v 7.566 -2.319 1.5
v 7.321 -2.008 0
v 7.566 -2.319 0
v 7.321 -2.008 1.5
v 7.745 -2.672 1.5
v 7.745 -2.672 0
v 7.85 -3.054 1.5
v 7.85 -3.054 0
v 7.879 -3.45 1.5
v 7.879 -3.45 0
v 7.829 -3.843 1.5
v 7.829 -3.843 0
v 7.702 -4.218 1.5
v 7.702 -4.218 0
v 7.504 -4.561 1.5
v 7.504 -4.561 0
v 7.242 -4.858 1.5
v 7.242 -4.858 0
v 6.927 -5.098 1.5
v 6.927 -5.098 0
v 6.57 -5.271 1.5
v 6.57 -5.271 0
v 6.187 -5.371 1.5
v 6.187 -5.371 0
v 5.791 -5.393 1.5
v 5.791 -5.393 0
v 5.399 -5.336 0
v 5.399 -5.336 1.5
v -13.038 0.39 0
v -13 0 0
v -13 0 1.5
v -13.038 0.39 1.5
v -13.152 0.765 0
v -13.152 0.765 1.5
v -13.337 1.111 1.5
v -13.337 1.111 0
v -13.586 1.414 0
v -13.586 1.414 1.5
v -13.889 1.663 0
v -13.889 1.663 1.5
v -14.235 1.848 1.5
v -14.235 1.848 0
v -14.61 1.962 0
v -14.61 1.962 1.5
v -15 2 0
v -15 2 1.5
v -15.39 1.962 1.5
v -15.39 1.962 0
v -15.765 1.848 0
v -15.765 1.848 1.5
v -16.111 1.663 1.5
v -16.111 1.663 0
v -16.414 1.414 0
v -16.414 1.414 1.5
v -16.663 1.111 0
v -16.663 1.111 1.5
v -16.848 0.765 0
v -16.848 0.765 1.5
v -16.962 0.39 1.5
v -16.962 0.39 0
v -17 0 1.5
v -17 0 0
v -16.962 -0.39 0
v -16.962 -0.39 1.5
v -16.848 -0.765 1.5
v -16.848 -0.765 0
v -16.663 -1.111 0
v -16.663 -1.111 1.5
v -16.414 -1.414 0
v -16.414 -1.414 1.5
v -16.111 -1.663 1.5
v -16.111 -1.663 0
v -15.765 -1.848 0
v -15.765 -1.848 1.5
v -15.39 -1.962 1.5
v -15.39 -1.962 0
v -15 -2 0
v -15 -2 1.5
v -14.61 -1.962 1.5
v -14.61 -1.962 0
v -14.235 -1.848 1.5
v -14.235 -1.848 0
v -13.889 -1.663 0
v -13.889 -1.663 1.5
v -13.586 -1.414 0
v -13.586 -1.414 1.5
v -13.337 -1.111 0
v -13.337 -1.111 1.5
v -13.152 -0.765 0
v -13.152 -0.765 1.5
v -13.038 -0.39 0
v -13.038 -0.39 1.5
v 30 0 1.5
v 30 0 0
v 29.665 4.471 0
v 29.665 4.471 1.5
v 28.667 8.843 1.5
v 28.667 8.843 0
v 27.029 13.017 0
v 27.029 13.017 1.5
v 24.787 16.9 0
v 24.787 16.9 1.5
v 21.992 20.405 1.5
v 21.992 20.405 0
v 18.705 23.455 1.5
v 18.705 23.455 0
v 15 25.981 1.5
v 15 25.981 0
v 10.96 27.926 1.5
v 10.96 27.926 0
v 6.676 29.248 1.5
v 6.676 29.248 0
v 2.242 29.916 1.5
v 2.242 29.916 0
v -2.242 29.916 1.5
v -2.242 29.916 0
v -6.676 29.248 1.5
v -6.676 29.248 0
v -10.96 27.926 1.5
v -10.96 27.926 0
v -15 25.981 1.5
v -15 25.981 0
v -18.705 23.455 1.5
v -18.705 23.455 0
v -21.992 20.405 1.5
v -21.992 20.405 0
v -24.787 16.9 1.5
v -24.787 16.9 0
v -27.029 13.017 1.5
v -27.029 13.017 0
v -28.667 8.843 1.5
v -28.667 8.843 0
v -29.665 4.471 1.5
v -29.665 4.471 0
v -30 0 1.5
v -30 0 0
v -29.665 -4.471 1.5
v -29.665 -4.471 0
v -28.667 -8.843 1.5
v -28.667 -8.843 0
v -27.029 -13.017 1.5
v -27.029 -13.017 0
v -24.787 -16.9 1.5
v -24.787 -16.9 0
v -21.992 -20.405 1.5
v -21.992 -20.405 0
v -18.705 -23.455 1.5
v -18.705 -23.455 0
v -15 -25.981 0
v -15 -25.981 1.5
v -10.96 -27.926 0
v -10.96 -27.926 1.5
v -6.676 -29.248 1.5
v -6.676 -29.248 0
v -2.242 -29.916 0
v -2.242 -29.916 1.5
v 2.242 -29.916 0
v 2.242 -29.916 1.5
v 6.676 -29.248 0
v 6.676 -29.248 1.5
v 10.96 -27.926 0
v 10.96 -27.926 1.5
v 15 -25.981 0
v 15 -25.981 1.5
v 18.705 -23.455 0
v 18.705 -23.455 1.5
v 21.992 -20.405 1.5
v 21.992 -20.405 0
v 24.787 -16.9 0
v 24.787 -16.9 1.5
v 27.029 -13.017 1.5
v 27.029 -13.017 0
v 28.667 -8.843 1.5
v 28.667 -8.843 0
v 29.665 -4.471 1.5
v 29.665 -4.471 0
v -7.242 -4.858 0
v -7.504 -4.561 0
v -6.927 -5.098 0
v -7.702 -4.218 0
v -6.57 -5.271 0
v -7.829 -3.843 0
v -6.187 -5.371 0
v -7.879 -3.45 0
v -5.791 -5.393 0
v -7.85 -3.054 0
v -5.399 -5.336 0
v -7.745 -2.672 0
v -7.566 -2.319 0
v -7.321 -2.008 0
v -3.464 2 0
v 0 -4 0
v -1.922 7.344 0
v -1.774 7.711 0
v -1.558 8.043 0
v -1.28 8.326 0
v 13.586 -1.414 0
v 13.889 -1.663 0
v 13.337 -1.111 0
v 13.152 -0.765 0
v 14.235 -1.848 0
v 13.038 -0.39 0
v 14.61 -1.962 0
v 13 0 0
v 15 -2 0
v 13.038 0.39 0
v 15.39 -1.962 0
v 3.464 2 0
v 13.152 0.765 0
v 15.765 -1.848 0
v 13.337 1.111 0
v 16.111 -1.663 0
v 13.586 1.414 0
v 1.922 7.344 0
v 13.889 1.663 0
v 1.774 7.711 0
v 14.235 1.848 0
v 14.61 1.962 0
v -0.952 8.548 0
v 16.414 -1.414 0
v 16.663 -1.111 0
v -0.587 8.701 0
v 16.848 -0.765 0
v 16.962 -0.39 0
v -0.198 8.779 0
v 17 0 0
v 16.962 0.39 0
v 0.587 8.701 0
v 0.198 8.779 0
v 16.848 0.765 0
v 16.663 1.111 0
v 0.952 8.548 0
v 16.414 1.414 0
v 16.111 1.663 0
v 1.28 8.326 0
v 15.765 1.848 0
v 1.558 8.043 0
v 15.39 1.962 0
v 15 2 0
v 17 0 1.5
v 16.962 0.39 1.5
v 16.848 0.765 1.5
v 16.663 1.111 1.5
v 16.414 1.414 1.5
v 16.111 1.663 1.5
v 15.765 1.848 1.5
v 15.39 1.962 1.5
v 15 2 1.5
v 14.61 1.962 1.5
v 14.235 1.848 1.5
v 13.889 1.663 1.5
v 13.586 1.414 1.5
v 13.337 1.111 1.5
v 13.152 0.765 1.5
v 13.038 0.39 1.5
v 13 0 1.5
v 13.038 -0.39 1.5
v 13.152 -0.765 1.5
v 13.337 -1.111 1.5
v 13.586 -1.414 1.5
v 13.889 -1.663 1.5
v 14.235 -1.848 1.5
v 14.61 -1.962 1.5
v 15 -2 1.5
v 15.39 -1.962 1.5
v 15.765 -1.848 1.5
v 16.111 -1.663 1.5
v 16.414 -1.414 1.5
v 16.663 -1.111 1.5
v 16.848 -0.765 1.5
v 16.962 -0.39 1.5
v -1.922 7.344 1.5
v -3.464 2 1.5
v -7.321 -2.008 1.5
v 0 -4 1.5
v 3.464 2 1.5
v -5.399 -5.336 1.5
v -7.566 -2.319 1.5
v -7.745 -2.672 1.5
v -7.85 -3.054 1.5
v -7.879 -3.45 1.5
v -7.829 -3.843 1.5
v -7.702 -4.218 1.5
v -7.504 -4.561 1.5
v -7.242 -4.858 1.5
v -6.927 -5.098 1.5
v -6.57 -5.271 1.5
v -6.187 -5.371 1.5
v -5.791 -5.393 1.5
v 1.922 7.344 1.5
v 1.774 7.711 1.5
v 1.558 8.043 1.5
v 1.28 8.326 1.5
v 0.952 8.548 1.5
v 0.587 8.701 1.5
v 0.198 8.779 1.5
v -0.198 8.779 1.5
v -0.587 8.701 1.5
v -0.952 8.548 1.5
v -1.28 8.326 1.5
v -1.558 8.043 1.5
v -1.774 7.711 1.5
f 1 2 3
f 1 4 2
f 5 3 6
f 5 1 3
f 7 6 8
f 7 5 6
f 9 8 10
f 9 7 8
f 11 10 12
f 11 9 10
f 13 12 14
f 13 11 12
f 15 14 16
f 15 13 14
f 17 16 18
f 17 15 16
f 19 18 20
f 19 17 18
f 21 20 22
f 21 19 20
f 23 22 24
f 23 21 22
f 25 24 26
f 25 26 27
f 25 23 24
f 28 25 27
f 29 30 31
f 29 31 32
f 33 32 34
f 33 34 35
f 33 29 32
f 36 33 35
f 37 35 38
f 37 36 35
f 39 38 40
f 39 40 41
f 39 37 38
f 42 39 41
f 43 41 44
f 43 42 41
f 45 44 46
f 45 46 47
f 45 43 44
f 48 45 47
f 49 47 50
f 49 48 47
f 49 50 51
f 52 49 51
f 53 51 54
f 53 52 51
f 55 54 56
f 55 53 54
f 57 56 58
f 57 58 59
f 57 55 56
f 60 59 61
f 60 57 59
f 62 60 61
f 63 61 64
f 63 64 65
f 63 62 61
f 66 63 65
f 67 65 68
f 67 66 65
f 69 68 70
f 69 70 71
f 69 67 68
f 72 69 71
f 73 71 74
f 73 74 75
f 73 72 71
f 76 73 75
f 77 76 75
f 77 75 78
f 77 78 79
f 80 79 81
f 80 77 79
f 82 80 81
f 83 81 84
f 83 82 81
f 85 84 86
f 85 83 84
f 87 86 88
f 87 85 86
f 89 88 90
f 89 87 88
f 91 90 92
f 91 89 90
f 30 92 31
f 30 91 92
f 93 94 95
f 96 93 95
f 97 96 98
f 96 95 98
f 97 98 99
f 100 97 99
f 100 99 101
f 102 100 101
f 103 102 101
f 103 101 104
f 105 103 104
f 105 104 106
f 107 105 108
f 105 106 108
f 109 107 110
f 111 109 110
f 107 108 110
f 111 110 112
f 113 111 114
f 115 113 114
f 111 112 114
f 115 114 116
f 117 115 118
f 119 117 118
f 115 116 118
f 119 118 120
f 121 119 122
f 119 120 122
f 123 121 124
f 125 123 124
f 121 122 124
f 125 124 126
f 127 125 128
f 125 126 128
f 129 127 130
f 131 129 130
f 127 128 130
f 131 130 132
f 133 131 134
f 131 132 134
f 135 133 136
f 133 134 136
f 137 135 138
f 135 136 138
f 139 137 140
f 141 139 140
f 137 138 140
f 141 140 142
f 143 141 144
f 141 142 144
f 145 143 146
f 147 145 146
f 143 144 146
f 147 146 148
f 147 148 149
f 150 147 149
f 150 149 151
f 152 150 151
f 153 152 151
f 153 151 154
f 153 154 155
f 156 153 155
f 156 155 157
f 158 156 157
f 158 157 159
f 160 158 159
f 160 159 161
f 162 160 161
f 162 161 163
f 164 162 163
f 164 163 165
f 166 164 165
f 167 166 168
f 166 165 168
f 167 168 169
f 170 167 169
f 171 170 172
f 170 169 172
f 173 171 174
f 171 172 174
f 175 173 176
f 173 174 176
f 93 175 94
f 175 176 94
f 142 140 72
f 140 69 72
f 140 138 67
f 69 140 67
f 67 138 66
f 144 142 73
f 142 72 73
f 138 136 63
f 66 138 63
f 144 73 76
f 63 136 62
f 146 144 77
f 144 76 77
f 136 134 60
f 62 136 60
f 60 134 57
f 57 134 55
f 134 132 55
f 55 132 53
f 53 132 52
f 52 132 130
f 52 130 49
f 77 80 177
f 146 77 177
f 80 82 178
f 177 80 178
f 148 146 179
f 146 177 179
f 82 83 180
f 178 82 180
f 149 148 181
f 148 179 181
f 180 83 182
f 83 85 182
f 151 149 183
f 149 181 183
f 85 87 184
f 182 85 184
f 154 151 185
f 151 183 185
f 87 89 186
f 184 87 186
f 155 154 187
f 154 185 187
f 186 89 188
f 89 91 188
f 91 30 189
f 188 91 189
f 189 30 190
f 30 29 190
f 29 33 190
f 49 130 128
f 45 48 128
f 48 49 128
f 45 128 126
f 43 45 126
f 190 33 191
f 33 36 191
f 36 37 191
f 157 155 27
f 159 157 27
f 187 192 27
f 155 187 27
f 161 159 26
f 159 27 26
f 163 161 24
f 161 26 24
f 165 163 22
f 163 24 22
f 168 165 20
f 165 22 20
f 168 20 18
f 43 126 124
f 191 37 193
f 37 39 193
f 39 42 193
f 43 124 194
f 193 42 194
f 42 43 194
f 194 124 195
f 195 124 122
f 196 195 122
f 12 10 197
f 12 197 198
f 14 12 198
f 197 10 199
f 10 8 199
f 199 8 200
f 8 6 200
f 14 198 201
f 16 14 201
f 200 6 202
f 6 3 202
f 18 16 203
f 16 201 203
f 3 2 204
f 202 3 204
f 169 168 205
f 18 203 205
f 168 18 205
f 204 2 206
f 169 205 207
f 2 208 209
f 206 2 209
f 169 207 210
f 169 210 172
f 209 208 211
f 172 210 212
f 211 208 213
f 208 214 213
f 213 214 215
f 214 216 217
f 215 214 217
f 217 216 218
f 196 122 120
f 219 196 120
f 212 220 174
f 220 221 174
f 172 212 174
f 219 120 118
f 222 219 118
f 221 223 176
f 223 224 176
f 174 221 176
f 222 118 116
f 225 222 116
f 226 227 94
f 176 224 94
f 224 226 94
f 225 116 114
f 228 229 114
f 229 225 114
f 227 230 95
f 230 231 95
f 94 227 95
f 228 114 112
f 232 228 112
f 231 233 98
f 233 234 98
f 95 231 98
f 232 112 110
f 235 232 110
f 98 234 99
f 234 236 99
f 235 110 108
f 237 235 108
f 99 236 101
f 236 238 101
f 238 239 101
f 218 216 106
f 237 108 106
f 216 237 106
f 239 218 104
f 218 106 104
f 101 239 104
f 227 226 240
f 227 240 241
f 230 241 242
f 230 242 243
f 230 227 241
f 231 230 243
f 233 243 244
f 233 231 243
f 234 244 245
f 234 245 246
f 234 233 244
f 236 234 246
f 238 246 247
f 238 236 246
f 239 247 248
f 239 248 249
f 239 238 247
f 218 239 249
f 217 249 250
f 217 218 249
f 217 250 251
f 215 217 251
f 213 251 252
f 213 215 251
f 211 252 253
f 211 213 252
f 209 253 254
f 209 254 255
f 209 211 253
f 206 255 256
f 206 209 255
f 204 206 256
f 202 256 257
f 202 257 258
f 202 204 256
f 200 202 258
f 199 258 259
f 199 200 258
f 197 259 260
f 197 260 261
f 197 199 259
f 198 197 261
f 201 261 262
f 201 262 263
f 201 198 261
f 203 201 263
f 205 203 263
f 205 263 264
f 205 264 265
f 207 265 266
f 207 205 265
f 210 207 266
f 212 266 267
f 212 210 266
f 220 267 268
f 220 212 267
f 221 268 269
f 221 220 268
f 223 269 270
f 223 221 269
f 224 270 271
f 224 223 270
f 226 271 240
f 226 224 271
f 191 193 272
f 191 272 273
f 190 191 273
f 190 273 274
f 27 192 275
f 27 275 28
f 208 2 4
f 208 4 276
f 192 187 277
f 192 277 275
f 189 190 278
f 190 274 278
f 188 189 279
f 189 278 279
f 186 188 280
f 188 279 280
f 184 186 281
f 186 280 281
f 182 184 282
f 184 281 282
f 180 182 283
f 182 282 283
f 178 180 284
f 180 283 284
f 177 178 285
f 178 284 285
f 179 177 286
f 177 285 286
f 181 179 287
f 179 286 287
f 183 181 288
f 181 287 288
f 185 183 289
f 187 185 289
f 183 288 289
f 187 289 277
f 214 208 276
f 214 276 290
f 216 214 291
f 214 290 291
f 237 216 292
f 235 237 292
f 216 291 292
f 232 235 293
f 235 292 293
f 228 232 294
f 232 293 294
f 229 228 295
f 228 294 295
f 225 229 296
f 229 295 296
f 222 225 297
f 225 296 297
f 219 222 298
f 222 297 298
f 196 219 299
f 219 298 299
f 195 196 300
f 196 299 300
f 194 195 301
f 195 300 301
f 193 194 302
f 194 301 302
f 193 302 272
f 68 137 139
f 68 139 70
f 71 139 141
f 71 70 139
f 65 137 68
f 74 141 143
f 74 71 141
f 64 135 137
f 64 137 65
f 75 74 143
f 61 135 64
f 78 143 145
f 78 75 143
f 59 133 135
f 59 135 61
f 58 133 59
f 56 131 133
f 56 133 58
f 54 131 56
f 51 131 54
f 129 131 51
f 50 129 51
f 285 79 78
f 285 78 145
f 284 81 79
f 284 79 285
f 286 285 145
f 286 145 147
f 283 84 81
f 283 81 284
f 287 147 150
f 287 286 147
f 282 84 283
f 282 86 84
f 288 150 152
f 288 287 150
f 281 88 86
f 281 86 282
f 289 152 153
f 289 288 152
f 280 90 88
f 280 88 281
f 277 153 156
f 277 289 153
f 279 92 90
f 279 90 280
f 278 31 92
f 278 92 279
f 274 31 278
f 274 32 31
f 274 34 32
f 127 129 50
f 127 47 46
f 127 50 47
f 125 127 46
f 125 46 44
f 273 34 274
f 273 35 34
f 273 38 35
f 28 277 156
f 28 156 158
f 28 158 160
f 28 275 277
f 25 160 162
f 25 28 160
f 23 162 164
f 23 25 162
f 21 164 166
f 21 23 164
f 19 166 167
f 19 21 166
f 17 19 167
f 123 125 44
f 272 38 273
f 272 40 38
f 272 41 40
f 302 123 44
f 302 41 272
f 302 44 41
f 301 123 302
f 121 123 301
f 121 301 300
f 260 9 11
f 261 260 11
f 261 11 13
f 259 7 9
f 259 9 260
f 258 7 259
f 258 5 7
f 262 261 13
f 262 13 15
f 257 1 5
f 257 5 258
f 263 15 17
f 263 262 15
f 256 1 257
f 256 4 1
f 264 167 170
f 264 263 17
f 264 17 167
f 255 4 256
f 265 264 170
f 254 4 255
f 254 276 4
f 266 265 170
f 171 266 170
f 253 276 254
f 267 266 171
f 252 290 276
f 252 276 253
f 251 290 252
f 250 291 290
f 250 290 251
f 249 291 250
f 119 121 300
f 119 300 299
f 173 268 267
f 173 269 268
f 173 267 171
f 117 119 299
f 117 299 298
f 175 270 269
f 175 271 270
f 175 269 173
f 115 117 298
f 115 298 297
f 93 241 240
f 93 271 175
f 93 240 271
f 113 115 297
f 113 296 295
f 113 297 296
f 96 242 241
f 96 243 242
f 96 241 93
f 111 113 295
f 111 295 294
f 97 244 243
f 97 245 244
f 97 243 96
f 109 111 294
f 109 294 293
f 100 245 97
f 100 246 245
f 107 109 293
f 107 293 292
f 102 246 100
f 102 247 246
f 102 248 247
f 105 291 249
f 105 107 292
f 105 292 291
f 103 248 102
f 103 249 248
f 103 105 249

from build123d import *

# Parameters (mm, degrees)
SKETCH1_R           = 30
SKETCH1_R_2         = 2
BOSS_EXTRUDE1_DEPTH = 1.5
CUT_EXTRUDE1_DEPTH  = 10
FILLET1_R           = 2


with BuildPart() as part:
    # Sketch1 → Boss-Extrude1 (new body)
    with BuildSketch(Plane.XY):
        Circle(SKETCH1_R)
        with Locations((15, 0)):
            Circle(SKETCH1_R_2, mode=Mode.SUBTRACT)
        with Locations((-15, 0)):
            Circle(SKETCH1_R_2, mode=Mode.SUBTRACT)
    extrude(amount=BOSS_EXTRUDE1_DEPTH)

    # Sketch2 → Cut-Extrude1 (cut)
    with BuildSketch(Plane(origin=(0, 0, 0), x_dir=(-1, 0, 0), z_dir=(0, 0, -1))):
        Polygon((-12.124355653, -7), (-3.464101615, 2), (0, 14), (3.464101615, 2), (12.124355653, -7), (0, -4), align=None)
    extrude(amount=-CUT_EXTRUDE1_DEPTH, mode=Mode.SUBTRACT)

    # Fillet1
    fillet1_edges = [part.edges().sort_by_distance(p)[0] for p in [
        (-12.124355653, -7, 0.75),
        (12.124355653, -7, 0.75),
        (0, 14, 0.75),
    ]]
    fillet(fillet1_edges, radius=FILLET1_R)


solid = part.part
